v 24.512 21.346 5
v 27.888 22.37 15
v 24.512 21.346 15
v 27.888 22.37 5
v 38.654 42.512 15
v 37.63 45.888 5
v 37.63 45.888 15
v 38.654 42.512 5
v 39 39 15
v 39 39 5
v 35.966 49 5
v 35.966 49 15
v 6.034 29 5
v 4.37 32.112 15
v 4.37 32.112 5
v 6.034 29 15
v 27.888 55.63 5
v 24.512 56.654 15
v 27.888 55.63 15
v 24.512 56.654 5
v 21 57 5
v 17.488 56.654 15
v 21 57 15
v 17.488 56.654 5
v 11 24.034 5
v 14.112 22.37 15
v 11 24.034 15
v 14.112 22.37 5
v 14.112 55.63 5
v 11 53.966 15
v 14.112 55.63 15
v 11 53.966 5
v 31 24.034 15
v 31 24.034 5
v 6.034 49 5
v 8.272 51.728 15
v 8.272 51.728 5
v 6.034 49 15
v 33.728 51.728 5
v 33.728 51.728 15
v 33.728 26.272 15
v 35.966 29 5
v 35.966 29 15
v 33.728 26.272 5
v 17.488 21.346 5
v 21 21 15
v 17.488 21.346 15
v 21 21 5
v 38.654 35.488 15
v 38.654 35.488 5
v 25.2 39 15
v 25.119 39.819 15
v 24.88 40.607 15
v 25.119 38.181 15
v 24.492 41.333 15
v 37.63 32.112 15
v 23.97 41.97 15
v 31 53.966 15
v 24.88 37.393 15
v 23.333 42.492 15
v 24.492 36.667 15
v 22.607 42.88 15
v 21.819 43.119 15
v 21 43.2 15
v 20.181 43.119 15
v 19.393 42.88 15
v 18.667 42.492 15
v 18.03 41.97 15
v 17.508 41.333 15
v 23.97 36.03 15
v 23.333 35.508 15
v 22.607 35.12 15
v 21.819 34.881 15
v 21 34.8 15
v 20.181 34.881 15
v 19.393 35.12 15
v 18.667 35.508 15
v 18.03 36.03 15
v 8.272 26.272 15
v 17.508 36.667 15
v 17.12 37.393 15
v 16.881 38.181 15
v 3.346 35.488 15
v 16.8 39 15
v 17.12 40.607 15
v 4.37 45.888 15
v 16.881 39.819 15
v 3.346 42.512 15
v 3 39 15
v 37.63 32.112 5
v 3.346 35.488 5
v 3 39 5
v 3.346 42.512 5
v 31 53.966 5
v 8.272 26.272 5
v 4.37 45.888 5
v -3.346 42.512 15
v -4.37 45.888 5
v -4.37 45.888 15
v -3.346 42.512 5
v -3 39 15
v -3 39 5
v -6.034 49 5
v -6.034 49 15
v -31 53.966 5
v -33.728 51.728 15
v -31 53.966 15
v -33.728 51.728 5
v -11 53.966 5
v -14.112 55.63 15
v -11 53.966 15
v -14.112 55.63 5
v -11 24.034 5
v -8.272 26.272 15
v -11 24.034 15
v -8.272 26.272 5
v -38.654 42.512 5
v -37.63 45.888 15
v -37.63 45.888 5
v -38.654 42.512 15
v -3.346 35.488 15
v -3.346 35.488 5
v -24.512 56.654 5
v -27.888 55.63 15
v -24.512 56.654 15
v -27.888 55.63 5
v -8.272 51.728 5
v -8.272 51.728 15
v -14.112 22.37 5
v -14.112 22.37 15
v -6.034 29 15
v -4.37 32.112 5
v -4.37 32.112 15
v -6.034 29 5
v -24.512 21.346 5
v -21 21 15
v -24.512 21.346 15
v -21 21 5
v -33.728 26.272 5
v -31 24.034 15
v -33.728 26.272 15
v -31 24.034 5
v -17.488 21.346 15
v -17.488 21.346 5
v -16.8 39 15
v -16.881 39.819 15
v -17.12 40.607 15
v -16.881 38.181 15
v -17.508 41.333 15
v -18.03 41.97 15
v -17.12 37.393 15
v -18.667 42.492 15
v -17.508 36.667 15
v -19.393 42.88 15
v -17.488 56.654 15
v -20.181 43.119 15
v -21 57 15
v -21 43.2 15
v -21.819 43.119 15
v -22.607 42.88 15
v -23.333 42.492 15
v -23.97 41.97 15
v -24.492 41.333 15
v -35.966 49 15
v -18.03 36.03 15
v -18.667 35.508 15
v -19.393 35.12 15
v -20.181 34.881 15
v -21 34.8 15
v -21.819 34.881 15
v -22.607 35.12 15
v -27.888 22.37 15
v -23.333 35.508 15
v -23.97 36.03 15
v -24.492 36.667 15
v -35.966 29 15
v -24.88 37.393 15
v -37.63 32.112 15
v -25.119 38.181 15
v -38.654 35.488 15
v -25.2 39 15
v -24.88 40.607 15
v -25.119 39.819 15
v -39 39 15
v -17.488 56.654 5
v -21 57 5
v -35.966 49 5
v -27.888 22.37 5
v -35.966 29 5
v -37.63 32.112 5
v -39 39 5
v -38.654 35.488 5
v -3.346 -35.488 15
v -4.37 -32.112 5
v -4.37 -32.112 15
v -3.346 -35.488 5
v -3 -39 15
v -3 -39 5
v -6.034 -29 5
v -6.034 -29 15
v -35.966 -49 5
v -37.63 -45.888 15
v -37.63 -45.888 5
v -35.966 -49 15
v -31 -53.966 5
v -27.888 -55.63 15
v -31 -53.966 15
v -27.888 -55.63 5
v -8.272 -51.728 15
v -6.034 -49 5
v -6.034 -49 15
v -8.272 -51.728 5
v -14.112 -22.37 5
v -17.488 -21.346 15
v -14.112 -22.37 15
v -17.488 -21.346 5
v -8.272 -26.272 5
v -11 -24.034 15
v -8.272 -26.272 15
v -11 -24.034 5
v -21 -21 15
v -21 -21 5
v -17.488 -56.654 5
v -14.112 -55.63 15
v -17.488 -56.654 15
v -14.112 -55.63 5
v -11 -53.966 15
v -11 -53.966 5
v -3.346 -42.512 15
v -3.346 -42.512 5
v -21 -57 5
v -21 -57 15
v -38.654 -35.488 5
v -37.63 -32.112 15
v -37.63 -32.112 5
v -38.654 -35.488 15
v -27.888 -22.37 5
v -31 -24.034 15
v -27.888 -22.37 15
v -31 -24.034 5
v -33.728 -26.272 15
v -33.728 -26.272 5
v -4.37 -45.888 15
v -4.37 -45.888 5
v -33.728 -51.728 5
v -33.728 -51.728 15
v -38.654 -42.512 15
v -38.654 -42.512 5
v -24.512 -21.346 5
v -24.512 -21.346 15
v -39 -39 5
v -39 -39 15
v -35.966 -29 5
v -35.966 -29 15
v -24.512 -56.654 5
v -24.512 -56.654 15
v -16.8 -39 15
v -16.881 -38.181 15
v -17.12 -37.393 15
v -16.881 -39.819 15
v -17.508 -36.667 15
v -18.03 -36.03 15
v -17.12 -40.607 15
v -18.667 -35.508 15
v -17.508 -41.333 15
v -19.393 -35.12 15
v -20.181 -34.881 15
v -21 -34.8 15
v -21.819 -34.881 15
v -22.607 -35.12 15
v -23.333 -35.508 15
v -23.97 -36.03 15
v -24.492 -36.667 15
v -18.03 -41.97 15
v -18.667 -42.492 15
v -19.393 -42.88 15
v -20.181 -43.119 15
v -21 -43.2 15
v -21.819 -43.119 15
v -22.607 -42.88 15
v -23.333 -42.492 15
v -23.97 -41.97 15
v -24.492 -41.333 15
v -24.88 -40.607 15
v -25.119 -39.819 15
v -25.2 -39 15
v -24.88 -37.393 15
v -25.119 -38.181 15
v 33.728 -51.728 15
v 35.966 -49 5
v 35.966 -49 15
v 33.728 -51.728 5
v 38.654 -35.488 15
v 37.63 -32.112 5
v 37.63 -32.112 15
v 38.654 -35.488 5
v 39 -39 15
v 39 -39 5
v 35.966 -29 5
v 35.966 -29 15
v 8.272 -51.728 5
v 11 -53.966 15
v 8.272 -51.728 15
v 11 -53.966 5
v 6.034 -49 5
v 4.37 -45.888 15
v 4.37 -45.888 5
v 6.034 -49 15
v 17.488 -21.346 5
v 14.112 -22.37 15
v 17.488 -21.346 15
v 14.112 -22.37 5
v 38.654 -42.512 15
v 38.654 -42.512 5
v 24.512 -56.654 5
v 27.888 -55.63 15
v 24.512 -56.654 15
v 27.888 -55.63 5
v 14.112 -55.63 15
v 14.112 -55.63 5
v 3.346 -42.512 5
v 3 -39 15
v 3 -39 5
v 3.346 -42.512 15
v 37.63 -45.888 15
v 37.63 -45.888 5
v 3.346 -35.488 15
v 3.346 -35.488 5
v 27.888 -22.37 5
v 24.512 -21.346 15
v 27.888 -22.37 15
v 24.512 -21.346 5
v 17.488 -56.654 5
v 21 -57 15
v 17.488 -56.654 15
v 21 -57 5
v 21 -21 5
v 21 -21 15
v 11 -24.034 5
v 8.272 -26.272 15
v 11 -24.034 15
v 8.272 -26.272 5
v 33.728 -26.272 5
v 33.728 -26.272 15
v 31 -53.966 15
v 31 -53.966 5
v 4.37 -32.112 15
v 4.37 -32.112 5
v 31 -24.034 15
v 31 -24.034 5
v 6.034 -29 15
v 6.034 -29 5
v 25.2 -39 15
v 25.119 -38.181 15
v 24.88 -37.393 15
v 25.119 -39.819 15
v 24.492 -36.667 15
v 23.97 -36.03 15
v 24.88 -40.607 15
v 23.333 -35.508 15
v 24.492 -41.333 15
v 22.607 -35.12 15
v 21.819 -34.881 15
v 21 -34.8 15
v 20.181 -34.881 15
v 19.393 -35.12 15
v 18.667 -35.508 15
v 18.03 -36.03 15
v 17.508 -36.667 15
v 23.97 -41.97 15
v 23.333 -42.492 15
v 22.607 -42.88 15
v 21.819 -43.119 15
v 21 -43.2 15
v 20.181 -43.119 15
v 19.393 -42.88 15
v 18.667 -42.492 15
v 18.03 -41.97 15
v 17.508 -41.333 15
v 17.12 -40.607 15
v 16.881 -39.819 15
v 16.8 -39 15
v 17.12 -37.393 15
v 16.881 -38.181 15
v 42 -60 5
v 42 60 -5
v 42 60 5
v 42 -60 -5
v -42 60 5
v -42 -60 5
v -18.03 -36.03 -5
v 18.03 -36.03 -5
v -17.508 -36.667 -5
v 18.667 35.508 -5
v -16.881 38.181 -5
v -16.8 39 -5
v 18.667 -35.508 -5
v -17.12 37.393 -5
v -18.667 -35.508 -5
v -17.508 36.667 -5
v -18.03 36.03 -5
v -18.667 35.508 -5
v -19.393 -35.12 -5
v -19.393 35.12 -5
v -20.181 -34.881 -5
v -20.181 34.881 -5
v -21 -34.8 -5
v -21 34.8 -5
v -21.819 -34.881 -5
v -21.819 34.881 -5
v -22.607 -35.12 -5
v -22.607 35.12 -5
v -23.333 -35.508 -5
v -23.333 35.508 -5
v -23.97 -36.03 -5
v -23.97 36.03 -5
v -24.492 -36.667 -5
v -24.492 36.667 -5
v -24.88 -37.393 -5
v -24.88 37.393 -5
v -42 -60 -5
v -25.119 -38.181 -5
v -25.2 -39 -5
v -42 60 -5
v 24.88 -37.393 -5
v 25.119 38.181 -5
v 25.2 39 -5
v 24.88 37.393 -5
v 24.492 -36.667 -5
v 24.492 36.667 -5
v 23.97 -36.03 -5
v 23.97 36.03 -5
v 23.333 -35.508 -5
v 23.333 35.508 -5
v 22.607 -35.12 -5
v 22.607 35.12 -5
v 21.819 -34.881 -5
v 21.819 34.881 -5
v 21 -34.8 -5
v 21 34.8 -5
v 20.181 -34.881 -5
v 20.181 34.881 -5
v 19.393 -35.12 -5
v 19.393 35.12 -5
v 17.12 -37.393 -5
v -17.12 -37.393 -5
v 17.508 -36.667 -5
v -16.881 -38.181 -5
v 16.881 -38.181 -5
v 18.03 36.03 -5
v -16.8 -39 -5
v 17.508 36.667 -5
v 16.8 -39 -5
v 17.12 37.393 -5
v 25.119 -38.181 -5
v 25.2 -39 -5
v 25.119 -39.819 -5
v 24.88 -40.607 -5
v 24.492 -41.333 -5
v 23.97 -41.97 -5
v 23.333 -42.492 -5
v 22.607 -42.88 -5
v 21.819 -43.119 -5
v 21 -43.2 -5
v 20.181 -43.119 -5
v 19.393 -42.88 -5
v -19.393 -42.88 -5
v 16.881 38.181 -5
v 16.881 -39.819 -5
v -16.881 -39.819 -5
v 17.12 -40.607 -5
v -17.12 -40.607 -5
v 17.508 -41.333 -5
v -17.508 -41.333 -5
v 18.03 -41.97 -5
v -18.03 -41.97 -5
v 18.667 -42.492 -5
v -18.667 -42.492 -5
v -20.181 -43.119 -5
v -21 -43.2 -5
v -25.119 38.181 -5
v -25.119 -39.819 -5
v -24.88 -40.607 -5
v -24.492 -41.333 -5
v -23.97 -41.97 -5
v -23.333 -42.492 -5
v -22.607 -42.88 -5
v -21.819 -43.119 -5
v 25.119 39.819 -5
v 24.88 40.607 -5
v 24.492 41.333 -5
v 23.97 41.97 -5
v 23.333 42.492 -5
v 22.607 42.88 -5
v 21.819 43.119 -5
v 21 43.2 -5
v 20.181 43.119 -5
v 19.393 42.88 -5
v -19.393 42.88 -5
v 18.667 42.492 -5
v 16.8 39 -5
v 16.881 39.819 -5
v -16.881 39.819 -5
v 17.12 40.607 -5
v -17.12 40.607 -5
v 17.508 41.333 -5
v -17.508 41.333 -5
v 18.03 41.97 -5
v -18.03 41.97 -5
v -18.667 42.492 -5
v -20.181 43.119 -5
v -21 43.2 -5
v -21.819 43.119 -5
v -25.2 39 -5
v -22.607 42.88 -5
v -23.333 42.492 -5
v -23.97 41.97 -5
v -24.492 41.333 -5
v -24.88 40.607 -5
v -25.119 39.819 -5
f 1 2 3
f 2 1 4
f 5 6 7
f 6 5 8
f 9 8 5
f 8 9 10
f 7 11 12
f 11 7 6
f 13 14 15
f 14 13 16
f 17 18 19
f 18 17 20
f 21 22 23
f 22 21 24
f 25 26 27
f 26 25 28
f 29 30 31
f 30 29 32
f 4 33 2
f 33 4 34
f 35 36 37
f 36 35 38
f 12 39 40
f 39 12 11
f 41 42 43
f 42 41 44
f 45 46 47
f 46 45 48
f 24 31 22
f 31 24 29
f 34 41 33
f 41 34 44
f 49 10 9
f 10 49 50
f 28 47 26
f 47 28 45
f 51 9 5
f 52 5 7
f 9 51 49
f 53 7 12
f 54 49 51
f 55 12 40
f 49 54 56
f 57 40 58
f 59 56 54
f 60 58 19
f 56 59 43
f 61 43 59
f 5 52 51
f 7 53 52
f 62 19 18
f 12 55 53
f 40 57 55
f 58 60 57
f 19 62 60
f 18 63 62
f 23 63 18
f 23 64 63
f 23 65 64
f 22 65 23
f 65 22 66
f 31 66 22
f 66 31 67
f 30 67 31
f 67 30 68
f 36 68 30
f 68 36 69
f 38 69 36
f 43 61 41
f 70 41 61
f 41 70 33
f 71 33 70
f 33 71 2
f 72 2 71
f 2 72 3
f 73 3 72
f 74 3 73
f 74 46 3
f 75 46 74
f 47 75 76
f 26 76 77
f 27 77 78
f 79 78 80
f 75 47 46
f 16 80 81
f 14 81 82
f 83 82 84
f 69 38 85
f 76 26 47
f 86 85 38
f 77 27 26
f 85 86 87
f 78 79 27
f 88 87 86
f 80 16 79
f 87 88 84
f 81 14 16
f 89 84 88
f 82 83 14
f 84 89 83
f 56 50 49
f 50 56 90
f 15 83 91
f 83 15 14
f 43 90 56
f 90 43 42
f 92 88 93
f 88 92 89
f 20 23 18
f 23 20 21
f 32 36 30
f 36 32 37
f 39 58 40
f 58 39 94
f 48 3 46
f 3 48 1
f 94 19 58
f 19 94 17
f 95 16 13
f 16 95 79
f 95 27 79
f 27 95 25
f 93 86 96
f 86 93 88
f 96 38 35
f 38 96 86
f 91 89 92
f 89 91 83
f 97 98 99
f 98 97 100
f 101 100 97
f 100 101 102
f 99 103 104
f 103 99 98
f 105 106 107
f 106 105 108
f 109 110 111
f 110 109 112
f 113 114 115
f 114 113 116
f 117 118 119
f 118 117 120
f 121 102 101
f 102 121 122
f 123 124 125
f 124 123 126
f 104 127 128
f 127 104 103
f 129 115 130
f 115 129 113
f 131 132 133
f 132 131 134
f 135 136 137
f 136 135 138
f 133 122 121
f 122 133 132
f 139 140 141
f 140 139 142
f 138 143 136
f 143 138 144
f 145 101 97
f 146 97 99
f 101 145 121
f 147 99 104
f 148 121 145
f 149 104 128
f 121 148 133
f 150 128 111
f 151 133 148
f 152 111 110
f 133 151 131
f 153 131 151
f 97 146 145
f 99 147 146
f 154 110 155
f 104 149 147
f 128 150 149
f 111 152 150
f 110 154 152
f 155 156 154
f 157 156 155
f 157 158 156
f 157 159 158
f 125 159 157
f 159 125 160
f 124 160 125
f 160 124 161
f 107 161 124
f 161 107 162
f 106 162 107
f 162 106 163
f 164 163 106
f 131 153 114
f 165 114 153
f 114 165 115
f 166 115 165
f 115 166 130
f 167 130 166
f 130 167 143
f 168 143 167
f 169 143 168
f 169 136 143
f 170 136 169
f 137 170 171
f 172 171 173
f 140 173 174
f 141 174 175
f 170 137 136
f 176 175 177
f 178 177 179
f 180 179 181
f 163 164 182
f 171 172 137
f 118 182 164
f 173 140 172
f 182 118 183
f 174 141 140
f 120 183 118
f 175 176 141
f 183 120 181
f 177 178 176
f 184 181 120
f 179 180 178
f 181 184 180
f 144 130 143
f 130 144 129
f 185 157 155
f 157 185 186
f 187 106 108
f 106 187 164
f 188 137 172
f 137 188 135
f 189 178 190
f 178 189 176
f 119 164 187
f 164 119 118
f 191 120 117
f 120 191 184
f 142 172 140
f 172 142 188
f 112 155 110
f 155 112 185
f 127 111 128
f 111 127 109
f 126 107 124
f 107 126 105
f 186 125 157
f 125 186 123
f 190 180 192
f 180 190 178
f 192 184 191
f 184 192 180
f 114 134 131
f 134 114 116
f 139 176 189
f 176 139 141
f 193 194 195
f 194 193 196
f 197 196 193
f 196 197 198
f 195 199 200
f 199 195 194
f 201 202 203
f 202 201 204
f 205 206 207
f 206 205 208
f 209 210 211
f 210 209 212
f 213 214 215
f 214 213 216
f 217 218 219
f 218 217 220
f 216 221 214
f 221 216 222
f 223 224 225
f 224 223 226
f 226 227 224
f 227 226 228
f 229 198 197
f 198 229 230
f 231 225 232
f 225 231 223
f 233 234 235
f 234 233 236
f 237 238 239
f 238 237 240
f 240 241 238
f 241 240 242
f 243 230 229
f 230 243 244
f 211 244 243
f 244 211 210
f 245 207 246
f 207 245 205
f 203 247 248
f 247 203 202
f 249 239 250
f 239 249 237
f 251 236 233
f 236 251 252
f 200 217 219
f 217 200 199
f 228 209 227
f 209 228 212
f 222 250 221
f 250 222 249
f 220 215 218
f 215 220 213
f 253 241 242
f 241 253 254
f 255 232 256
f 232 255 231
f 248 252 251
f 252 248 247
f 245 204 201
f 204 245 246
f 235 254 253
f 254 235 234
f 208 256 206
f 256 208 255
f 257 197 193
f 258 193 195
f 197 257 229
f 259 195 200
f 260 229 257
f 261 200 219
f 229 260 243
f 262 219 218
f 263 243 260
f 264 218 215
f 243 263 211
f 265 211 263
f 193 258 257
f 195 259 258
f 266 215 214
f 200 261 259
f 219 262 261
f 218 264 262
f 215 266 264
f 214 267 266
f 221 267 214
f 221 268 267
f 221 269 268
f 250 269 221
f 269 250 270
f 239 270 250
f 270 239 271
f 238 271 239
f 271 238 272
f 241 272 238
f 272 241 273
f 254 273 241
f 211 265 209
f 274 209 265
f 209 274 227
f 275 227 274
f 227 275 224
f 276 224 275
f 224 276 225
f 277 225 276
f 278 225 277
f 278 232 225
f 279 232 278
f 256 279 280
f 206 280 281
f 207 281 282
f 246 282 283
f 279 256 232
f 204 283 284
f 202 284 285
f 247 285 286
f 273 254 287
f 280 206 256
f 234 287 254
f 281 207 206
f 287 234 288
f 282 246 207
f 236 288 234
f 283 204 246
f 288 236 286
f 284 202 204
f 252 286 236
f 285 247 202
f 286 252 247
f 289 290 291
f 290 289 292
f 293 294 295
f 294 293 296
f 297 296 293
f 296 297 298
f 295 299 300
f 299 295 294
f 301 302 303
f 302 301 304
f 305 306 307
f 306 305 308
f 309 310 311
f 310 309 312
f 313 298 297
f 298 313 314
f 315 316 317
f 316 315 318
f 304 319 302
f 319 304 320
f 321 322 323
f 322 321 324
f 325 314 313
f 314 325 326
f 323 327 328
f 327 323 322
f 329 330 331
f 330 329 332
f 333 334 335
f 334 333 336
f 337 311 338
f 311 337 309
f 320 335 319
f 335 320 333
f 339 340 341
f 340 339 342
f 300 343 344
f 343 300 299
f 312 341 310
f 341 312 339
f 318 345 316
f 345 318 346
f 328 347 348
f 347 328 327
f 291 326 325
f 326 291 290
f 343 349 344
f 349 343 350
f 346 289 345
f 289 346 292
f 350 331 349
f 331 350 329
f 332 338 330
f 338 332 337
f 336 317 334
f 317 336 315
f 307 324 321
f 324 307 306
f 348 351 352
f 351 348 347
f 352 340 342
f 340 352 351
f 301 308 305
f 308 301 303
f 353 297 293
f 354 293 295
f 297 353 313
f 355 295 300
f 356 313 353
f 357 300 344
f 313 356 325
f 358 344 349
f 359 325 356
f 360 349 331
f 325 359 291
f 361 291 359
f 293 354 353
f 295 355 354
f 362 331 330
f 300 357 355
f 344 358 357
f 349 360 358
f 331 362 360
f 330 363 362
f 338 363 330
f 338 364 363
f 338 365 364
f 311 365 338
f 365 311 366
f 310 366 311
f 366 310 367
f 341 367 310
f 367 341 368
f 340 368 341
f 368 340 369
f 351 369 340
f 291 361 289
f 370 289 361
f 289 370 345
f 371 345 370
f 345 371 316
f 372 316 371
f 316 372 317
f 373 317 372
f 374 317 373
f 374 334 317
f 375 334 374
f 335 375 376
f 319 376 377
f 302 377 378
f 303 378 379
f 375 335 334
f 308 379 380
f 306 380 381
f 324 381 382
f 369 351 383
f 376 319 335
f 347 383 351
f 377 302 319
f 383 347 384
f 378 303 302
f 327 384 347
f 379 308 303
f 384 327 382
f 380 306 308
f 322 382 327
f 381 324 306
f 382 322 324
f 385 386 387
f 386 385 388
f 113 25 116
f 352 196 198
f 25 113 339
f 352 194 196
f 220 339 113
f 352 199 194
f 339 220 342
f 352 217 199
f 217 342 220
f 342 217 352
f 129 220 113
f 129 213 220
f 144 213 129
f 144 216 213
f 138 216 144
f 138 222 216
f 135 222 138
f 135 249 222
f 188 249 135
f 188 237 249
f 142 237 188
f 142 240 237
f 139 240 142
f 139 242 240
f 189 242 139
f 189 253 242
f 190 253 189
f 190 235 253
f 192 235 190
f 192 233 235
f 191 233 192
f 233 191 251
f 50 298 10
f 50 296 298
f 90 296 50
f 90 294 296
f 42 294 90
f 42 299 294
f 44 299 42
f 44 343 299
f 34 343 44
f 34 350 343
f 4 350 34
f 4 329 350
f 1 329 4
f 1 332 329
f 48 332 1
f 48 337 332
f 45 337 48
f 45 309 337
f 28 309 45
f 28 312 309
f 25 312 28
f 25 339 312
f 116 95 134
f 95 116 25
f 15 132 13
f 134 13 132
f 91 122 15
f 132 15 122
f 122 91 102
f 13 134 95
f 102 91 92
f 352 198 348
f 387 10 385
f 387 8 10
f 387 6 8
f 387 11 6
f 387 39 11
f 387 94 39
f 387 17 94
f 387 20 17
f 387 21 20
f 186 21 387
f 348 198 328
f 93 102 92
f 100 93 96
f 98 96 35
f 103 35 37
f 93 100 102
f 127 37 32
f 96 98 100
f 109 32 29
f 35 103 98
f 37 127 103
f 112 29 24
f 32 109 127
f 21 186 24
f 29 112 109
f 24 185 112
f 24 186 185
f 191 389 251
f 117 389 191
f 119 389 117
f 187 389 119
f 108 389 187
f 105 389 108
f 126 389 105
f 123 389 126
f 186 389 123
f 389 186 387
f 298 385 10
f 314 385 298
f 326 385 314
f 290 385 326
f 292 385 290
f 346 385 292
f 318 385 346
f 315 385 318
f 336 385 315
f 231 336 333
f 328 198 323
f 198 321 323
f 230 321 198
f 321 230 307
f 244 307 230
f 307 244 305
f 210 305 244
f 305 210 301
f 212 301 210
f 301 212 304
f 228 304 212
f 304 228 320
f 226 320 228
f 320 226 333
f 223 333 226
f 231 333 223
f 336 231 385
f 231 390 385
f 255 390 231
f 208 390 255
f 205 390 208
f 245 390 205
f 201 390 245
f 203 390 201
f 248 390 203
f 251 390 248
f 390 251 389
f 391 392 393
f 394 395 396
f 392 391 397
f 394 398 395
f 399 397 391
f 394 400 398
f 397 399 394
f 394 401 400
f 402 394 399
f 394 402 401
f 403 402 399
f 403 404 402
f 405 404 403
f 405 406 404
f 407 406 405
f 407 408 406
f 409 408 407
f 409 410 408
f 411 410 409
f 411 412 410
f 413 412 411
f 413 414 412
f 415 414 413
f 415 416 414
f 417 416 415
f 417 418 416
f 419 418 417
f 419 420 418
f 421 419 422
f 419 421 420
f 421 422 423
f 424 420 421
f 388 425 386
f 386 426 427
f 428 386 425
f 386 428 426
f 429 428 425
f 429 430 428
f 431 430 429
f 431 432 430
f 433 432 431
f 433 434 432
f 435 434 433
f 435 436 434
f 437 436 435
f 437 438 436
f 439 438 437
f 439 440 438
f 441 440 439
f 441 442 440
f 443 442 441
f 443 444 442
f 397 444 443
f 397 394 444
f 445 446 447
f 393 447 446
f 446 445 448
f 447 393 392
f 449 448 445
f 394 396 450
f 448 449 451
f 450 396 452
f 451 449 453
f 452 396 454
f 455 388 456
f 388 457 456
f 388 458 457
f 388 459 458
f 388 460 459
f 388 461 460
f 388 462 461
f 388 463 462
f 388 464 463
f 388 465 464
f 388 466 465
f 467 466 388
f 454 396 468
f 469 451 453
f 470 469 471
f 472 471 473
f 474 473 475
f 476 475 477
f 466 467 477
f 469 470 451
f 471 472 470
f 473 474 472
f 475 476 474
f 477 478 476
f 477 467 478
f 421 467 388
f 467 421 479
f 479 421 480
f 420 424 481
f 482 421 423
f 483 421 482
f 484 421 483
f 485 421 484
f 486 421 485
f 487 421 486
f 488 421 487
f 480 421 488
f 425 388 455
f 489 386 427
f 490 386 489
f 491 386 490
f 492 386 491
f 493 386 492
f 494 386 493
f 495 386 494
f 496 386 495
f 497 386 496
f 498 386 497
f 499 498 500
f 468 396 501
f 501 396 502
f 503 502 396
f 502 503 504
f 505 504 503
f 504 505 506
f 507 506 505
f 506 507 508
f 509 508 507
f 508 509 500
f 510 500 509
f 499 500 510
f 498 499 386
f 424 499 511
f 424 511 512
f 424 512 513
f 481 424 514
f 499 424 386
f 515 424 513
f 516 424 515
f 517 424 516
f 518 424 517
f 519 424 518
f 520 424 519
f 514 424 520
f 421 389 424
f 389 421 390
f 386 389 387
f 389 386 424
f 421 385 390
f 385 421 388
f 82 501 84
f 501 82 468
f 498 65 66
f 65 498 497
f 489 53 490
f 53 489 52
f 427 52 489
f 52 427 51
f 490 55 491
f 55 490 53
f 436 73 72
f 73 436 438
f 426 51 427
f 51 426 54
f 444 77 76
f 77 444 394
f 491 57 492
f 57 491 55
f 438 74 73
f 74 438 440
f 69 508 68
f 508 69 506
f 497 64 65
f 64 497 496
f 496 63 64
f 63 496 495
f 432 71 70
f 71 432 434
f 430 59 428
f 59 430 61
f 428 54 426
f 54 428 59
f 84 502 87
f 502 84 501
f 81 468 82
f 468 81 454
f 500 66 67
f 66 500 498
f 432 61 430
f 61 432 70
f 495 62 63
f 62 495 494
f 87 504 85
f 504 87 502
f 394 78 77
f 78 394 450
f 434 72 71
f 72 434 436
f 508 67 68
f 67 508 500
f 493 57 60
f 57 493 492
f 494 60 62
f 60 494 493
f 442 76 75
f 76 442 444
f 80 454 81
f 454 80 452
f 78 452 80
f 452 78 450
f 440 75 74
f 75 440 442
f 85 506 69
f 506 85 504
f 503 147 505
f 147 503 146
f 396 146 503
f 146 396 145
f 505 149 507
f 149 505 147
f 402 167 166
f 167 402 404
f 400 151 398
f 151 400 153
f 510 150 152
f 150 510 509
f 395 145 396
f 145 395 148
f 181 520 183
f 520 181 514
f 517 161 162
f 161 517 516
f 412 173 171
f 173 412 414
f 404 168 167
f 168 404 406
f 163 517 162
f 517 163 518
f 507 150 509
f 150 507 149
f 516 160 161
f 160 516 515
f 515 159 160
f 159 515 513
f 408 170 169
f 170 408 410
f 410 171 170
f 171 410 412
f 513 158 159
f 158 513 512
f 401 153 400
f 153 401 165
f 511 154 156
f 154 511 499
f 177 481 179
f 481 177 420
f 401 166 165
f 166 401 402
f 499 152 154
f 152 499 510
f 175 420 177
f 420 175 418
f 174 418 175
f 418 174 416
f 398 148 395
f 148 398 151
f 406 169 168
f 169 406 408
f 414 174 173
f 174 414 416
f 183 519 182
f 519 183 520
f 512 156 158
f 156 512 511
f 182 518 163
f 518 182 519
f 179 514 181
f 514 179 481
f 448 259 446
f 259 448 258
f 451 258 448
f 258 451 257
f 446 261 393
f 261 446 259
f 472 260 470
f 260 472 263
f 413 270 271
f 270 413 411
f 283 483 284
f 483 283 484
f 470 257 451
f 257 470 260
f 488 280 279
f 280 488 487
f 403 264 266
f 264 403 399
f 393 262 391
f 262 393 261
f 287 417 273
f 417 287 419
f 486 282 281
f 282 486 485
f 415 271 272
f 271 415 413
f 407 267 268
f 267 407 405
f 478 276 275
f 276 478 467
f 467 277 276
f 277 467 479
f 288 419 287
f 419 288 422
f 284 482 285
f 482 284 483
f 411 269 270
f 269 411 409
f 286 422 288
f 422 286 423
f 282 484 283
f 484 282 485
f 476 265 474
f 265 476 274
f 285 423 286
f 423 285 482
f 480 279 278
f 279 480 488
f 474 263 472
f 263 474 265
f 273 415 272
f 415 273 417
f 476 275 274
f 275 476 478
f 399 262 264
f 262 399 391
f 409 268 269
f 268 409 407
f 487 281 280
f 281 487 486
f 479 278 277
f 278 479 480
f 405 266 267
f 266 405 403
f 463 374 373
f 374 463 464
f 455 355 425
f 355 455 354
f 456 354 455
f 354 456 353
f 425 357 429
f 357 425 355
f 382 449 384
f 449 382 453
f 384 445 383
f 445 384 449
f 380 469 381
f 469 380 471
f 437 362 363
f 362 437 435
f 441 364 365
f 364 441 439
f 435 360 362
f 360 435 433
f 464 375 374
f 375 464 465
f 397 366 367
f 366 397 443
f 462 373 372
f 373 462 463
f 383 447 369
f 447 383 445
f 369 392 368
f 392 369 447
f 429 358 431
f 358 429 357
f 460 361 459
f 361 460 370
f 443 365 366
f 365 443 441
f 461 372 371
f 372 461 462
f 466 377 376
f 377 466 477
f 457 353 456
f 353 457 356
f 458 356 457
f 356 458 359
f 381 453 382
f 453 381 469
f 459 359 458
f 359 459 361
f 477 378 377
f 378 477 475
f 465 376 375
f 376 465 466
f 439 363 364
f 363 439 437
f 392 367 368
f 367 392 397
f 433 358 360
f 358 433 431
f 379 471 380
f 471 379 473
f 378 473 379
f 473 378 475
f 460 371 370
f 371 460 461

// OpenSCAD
$fn = 32;

// ----------------------------------------------------------------------
// Anchor pads 84 x 120 x 20
// four corner bosses with anchor holes
// ----------------------------------------------------------------------

// --- parameters (mm) ---
plate = [84, 120, 10];  // base plate size (x, y, z)
pads = 4;               // boss count, one per corner
edge = 21;              // boss centre offset from the plate edge
boss_d = 36;            // boss diameter
boss_h = 10;            // boss height above the base plate
hole_d = 8.4;           // hole diameter

// --- derived feature positions (mm) ---
height = plate[2] + boss_h;      // = 20   overall height of the part
corner_x = plate[0] / 2 - edge;  // = 21   boss centre X
corner_y = plate[1] / 2 - edge;  // = 39   boss centre Y
feature_centers = [
  [corner_x, corner_y],
  [-corner_x, corner_y],
  [-corner_x, -corner_y],
  [corner_x, -corner_y]
];   // boss centres, anchor holes are drilled there

// base plate, four bosses standing on it, anchor holes all the way through
difference() {
  union() {
    cube(plate, center = true);
    for (centre = feature_centers)
      translate([centre[0], centre[1], plate[2] / 2 - 1])
        cylinder(d = boss_d, h = boss_h + 1);
  }
  for (centre = feature_centers)
    translate([centre[0], centre[1], -height])
      cylinder(d = hole_d, h = 2 * height + 2);  // through boss and plate
}
